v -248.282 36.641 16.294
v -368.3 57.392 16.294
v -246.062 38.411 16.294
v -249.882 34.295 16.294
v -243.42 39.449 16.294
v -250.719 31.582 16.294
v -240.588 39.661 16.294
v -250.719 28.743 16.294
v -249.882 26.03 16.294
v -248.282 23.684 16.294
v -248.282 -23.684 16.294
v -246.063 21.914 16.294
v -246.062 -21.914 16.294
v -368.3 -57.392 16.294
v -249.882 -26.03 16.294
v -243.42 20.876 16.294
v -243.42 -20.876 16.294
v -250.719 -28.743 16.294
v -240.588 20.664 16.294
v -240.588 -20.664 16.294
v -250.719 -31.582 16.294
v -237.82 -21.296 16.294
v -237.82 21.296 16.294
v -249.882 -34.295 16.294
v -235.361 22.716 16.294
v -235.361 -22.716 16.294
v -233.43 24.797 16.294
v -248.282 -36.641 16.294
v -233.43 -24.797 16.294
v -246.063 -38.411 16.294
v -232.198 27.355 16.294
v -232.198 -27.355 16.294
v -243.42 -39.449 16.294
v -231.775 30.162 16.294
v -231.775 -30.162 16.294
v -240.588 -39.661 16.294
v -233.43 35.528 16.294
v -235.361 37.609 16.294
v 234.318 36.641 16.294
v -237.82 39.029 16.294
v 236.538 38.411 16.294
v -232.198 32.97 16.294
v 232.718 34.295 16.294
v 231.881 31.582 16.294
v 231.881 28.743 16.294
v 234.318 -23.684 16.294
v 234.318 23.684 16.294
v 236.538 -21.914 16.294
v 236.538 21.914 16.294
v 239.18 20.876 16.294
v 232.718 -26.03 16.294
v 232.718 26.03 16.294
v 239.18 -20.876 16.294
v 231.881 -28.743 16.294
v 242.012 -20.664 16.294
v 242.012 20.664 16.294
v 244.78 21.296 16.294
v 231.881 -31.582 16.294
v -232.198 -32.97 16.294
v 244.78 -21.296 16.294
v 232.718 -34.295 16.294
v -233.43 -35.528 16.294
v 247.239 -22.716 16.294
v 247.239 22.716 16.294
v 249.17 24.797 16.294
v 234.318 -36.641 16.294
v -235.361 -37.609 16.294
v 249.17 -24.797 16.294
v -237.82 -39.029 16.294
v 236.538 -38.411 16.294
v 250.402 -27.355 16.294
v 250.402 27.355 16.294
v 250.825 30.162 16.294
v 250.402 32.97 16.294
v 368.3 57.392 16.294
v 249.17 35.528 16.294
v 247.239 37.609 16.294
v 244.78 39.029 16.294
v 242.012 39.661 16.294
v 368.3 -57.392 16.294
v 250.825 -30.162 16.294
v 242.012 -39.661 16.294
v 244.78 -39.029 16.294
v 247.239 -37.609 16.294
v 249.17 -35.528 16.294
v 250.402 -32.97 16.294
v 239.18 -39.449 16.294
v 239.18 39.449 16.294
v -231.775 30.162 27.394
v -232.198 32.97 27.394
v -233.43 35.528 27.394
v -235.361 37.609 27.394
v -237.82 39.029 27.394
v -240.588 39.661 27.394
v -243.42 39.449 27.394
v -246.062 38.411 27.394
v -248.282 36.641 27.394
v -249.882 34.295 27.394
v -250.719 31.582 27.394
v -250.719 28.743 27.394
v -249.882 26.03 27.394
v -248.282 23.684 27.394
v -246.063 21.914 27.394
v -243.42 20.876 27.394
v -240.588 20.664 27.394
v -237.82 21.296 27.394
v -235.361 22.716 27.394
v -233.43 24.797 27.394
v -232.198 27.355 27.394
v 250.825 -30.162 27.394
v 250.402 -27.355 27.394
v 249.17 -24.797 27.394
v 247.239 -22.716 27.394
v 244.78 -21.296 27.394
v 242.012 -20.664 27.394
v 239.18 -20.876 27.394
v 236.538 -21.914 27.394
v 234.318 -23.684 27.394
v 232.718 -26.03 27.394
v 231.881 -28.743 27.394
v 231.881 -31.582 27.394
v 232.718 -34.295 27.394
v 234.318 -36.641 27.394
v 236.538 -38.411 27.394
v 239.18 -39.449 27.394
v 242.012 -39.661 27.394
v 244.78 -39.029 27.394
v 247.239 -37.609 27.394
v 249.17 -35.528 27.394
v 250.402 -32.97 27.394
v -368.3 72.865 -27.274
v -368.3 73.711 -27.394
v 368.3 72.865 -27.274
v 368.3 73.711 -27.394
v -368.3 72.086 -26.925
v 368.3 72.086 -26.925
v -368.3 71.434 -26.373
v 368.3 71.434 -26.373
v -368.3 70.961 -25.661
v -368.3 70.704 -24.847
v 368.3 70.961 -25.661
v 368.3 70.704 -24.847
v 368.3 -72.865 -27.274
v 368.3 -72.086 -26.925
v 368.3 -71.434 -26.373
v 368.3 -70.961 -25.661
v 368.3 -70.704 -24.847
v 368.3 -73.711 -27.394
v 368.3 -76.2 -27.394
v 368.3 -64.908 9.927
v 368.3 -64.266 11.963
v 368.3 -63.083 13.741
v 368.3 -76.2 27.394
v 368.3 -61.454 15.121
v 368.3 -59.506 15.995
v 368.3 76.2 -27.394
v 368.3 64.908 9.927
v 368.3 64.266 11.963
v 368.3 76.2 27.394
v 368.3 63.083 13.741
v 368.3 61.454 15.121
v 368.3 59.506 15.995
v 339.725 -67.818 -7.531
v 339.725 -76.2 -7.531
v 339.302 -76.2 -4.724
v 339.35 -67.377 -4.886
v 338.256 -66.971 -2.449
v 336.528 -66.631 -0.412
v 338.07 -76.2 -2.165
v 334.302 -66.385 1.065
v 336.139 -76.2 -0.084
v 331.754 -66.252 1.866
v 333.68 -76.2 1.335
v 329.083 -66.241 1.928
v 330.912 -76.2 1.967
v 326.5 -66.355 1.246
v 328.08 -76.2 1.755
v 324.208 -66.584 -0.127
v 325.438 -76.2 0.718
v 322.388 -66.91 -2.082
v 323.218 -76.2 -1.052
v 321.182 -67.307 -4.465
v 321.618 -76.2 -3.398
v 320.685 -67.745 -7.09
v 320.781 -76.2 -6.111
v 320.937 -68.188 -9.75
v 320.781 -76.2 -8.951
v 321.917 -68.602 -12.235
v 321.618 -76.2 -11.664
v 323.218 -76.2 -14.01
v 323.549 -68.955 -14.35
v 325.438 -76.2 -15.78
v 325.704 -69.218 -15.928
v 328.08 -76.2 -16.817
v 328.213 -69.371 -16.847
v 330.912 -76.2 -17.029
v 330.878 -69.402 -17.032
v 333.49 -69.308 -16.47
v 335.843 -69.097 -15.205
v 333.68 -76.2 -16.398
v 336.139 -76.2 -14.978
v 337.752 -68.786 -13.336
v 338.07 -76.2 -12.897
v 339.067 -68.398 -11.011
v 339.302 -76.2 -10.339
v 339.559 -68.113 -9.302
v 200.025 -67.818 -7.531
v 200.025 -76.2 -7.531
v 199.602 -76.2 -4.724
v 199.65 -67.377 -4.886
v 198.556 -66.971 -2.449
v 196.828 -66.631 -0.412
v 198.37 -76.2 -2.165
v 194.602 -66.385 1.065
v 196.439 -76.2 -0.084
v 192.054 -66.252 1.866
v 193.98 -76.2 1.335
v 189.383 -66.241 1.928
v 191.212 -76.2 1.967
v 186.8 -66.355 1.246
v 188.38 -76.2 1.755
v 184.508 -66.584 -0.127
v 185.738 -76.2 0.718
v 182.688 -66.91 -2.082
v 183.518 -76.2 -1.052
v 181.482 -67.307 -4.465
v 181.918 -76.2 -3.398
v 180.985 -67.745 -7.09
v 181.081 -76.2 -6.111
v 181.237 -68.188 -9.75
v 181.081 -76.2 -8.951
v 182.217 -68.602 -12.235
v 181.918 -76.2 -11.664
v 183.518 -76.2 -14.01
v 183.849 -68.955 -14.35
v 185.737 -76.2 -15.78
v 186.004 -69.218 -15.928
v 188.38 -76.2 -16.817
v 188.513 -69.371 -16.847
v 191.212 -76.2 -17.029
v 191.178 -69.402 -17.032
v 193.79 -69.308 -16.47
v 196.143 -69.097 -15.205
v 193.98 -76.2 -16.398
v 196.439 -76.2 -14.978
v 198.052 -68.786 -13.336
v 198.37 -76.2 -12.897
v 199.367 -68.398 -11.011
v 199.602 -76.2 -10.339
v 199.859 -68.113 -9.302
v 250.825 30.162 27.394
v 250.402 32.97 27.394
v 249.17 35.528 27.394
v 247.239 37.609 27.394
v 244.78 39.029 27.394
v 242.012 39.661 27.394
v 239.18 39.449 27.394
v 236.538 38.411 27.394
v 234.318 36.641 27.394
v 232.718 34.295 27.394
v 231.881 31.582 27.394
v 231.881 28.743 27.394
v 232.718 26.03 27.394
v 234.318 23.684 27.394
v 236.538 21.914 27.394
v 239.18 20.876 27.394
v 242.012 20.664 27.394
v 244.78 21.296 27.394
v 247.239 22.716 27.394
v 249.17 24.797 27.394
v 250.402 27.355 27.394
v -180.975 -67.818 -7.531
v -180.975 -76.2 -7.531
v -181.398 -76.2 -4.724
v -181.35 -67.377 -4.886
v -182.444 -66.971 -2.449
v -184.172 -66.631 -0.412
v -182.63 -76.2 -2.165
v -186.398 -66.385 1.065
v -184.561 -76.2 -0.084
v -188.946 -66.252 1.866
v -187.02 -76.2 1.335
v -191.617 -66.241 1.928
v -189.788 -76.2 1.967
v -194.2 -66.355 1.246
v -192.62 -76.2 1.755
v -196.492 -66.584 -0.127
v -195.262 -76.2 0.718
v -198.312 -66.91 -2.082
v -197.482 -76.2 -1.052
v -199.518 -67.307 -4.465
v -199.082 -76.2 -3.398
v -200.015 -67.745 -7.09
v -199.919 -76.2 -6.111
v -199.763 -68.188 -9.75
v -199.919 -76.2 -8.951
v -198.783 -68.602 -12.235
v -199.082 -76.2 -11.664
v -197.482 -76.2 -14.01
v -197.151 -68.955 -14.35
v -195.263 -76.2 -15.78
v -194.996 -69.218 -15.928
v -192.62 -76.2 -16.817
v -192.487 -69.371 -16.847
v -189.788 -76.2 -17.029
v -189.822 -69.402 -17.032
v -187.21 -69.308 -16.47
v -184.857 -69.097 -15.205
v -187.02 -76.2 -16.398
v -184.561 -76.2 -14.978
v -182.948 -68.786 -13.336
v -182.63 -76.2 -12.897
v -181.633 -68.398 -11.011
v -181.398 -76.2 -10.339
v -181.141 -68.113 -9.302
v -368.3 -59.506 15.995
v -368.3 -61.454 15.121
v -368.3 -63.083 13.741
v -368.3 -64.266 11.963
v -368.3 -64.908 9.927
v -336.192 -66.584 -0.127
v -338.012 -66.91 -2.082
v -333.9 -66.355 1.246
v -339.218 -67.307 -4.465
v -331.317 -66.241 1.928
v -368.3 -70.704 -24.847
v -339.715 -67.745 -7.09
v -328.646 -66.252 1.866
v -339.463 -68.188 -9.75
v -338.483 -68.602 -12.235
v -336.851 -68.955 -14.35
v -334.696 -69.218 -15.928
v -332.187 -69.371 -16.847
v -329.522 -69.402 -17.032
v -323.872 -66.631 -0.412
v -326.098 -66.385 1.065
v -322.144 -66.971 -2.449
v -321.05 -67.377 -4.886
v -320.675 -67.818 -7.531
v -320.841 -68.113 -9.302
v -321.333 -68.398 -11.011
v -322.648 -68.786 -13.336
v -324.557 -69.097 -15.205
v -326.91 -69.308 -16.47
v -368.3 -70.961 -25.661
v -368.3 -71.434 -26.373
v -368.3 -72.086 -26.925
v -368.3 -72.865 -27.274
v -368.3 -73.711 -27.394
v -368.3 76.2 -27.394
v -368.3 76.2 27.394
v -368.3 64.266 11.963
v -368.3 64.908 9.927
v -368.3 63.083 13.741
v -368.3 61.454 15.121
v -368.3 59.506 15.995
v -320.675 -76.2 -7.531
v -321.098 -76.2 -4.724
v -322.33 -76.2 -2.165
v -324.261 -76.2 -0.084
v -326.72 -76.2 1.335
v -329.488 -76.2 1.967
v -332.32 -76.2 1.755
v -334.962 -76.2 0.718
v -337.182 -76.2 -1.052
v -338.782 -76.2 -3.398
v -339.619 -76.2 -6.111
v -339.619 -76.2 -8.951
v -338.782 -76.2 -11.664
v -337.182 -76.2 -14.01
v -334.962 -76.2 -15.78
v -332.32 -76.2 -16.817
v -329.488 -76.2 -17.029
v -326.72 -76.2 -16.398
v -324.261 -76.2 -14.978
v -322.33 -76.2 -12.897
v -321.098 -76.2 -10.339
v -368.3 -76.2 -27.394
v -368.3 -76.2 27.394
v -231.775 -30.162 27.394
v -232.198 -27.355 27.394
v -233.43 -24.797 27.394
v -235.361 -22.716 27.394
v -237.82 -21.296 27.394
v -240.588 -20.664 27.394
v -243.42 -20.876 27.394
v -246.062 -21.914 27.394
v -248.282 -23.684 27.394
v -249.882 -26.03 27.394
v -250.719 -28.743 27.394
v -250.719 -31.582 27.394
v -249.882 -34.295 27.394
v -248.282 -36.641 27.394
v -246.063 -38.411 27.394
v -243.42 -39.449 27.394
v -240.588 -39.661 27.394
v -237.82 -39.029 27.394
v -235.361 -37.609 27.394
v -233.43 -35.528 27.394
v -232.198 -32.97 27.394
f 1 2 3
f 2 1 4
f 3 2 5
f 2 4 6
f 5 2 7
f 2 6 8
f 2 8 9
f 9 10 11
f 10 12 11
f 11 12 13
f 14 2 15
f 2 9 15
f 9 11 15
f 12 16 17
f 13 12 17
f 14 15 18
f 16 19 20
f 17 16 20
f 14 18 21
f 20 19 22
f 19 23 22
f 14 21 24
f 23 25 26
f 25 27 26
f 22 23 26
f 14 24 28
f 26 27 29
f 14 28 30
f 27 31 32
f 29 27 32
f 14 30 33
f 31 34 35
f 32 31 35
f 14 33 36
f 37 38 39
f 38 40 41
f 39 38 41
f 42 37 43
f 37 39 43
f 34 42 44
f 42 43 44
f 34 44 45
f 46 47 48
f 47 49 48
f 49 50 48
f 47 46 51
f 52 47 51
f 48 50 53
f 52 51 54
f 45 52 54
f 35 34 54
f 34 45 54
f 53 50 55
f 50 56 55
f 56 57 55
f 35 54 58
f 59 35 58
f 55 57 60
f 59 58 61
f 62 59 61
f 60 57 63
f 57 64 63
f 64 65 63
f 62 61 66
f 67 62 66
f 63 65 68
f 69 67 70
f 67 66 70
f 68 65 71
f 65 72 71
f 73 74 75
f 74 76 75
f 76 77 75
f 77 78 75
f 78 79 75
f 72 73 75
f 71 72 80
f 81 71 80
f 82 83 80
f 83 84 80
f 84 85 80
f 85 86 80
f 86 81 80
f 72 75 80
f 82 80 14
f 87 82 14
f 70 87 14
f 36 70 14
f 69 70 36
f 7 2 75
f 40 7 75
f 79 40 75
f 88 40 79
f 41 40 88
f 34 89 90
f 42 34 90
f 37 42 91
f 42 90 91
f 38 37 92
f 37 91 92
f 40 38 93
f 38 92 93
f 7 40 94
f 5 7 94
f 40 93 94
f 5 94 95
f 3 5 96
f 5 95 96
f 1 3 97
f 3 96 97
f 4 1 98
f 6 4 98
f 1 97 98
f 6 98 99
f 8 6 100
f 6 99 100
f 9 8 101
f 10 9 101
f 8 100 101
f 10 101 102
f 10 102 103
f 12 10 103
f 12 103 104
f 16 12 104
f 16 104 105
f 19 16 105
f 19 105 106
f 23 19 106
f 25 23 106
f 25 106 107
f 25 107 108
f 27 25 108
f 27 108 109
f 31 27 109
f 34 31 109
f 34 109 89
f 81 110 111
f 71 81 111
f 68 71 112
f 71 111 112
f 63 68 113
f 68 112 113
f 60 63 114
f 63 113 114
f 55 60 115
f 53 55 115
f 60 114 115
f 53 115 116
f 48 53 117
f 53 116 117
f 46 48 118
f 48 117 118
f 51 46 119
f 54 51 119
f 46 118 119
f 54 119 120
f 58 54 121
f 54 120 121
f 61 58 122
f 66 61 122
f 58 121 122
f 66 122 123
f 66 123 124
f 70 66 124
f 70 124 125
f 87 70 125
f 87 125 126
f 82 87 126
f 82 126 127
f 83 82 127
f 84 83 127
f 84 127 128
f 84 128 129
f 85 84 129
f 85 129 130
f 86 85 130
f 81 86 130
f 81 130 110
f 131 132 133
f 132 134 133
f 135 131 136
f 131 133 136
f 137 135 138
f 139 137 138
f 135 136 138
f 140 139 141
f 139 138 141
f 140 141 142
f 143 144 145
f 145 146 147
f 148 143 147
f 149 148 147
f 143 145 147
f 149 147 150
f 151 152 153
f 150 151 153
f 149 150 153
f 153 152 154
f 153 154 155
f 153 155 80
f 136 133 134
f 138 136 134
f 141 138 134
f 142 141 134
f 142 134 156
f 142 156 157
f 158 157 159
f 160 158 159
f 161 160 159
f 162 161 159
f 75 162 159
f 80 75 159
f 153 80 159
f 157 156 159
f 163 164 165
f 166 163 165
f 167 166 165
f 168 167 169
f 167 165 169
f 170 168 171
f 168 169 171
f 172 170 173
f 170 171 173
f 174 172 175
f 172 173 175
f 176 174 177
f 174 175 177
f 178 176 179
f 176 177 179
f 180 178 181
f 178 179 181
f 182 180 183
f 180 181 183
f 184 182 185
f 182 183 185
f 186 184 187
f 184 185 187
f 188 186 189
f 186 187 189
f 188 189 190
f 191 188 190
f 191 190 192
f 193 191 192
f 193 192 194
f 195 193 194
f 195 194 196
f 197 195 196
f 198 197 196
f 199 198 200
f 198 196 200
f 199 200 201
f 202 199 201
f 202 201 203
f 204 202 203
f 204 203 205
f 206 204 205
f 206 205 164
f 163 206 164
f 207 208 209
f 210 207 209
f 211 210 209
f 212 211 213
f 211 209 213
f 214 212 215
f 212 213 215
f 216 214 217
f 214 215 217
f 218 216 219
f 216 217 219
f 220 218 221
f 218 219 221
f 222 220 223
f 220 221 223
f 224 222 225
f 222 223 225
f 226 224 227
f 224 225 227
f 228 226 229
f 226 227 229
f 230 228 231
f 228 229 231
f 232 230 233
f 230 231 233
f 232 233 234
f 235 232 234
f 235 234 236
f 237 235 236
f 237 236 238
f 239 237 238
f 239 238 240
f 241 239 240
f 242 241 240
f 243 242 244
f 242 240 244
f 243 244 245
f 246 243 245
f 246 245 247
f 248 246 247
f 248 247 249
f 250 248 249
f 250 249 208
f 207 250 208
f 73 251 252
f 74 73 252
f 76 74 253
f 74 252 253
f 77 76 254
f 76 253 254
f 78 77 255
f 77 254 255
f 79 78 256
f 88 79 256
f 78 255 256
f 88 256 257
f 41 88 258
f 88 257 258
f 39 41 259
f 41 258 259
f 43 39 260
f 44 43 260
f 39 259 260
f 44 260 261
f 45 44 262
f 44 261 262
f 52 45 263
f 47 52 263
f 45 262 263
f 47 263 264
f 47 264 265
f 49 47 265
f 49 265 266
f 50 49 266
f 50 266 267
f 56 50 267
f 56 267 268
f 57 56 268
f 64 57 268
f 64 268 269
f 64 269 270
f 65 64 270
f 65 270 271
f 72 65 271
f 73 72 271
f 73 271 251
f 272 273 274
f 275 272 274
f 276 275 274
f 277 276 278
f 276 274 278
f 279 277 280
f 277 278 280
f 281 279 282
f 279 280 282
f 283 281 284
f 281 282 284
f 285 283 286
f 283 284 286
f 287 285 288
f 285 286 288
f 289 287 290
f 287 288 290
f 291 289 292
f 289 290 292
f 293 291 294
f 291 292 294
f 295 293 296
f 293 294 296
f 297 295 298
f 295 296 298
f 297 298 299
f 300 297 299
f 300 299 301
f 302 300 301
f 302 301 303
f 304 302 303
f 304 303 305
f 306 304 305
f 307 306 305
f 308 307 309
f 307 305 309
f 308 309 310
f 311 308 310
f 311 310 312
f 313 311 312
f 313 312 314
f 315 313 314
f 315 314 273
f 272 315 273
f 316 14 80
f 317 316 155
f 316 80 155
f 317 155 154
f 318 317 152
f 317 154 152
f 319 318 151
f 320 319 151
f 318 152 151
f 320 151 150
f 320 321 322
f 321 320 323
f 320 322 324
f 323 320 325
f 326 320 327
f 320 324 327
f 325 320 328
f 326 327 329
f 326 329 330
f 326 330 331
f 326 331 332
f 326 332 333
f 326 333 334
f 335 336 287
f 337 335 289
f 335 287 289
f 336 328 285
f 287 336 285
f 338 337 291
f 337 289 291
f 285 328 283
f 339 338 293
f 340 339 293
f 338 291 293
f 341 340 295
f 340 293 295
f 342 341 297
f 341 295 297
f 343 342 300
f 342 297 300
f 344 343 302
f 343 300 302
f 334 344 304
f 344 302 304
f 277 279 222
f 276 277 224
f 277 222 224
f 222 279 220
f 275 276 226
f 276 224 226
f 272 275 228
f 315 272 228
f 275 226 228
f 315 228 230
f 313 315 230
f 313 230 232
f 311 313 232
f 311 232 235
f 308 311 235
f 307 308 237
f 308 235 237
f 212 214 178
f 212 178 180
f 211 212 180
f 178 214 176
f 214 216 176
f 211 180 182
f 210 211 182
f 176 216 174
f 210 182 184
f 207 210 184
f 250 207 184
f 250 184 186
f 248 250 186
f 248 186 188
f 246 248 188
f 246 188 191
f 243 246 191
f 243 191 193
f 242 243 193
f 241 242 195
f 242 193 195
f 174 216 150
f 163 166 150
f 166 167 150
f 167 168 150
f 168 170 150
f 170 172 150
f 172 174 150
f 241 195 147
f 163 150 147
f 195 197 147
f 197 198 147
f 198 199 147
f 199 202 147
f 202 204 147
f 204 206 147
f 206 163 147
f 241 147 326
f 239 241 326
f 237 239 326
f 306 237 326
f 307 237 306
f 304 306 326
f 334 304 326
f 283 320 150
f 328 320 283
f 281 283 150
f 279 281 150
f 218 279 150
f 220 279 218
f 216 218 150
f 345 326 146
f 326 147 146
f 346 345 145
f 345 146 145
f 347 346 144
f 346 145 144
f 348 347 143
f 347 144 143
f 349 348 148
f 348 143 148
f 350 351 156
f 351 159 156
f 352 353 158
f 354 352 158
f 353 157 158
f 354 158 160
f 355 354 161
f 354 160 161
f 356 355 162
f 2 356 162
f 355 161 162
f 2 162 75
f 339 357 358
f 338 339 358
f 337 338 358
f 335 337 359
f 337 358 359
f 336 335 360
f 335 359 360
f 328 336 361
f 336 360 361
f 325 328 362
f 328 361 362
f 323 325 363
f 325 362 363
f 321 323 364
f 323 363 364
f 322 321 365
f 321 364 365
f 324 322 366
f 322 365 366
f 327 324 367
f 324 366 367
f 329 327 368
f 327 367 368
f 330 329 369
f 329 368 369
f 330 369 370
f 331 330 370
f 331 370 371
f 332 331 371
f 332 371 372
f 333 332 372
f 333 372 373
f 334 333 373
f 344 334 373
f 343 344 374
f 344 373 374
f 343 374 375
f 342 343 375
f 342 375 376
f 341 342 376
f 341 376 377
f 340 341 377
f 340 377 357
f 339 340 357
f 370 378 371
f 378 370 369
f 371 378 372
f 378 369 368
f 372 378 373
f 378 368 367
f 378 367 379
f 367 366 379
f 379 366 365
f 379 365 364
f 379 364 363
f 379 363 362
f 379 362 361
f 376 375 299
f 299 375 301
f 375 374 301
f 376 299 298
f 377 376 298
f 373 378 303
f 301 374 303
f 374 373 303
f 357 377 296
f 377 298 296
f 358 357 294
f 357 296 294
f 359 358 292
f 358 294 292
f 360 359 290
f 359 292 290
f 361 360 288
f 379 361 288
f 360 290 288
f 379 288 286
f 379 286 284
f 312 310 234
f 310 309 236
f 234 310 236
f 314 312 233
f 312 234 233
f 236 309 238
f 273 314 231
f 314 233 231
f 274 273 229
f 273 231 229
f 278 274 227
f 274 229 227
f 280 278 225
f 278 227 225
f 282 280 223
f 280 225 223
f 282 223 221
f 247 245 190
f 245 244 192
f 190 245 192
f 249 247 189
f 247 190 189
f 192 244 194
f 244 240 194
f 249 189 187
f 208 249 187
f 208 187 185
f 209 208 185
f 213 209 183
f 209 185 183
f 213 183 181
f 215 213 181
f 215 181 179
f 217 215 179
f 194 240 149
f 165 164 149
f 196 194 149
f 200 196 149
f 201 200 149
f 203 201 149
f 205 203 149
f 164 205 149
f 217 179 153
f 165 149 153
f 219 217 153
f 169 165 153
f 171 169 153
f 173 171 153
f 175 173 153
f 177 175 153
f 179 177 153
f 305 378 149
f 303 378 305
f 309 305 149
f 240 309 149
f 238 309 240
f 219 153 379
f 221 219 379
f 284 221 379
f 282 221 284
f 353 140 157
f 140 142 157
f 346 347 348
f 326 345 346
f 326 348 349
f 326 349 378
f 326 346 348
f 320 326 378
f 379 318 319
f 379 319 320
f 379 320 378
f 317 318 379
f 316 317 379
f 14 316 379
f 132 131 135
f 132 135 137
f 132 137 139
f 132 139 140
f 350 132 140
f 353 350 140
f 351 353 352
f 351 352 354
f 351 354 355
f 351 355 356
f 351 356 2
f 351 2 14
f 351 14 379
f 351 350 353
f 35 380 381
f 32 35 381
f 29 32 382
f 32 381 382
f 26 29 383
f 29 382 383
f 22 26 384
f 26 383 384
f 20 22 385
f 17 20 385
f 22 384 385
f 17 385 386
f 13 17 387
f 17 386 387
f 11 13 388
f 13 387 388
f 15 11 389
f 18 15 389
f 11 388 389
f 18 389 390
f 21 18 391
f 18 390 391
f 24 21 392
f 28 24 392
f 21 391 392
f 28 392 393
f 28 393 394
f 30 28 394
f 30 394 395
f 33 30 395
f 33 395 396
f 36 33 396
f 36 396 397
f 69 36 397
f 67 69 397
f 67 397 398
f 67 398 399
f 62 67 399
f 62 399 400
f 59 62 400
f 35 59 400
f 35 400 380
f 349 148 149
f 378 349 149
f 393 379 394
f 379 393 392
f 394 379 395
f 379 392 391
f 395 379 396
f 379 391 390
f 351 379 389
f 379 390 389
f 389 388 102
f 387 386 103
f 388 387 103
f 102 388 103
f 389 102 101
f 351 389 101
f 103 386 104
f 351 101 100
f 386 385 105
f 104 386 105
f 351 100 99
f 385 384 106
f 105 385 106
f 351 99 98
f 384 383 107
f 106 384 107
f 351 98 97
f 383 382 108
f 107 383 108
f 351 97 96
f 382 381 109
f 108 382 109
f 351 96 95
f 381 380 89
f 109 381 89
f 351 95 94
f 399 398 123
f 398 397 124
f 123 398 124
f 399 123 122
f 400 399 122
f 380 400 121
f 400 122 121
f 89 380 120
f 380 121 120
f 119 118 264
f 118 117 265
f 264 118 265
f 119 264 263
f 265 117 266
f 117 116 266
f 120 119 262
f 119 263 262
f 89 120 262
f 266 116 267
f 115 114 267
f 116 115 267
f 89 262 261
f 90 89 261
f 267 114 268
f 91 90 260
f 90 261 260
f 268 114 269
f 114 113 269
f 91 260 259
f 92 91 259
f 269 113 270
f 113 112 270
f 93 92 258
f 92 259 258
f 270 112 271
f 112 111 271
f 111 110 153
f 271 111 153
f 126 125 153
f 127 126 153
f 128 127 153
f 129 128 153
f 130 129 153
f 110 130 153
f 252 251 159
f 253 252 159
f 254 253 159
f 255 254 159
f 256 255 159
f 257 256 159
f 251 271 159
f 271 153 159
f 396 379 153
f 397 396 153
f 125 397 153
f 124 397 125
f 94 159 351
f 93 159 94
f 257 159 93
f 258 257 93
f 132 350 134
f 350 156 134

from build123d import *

# Parameters (mm, degrees)
BOSS_EXTRUDE1_DEPTH = 368.3
CUT_EXTRUDE1_REACH  = 154.4
SKETCH2_R           = 9.525
CUT_EXTRUDE2_REACH  = 56.788
SKETCH3_R           = 9.525


with BuildPart() as part:
    # Sketch1 → Boss-Extrude1 (new body, symmetric)
    with BuildSketch(Plane(origin=(0, 0, 0), x_dir=(0, 0, -1), z_dir=(1, 0, 0))):
        with BuildLine():
            Line((-27.3939, -76.2), (-27.3939, 76.2))
            Line((-27.3939, 76.2), (27.3939, 76.2))
            Line((27.3939, 76.2), (27.3939, 73.710744653))
            ThreePointArc((27.3939, 73.710744653), (26.67159656, 71.740607726), (24.84702368, 70.704221901))
            Line((24.84702368, 70.704221901), (-9.926909199, 64.908143628))
            ThreePointArc((-9.926909199, 64.908143628), (-14.488341399, 62.317179067), (-16.2941, 57.391836749))
            Line((-16.2941, 57.391836749), (-16.2941, -57.391836749))
            ThreePointArc((-16.2941, -57.391836749), (-14.488341399, -62.317179067), (-9.926909199, -64.908143628))
            Line((-9.926909199, -64.908143628), (24.84702368, -70.704221901))
            ThreePointArc((24.84702368, -70.704221901), (26.67159656, -71.740607726), (27.3939, -73.710744653))
            Line((27.3939, -73.710744653), (27.3939, -76.2))
            Line((27.3939, -76.2), (-27.3939, -76.2))
        make_face()
    extrude(amount=BOSS_EXTRUDE1_DEPTH, both=True)

    # Sketch2 → Cut-Extrude1 (cut, up to next)
    with BuildSketch(Plane.XZ.offset(76.2), mode=Mode.PRIVATE) as cut_extrude1_sk1:
        with Locations((190.5, -7.5311)):
            Circle(SKETCH2_R)
    cut_extrude1_tool1 = extrude(cut_extrude1_sk1.sketch, amount=-CUT_EXTRUDE1_REACH, mode=Mode.PRIVATE) & part.part
    add(cut_extrude1_tool1.solids().sort_by_distance((190.5, -76.2, -7.5311))[0], mode=Mode.SUBTRACT)
    # Sketch2 → Cut-Extrude1 (cut, up to next)
    with BuildSketch(Plane.XZ.offset(76.2), mode=Mode.PRIVATE) as cut_extrude1_sk2:
        with Locations((-190.5, -7.5311)):
            Circle(SKETCH2_R)
    cut_extrude1_tool2 = extrude(cut_extrude1_sk2.sketch, amount=-CUT_EXTRUDE1_REACH, mode=Mode.PRIVATE) & part.part
    add(cut_extrude1_tool2.solids().sort_by_distance((-190.5, -76.2, -7.5311))[0], mode=Mode.SUBTRACT)
    # Sketch2 → Cut-Extrude1 (cut, up to next)
    with BuildSketch(Plane.XZ.offset(76.2), mode=Mode.PRIVATE) as cut_extrude1_sk3:
        with Locations((330.2, -7.5311)):
            Circle(SKETCH2_R)
    cut_extrude1_tool3 = extrude(cut_extrude1_sk3.sketch, amount=-CUT_EXTRUDE1_REACH, mode=Mode.PRIVATE) & part.part
    add(cut_extrude1_tool3.solids().sort_by_distance((330.2, -76.2, -7.5311))[0], mode=Mode.SUBTRACT)
    # Sketch2 → Cut-Extrude1 (cut, up to next)
    with BuildSketch(Plane.XZ.offset(76.2), mode=Mode.PRIVATE) as cut_extrude1_sk4:
        with Locations((-330.2, -7.5311)):
            Circle(SKETCH2_R)
    cut_extrude1_tool4 = extrude(cut_extrude1_sk4.sketch, amount=-CUT_EXTRUDE1_REACH, mode=Mode.PRIVATE) & part.part
    add(cut_extrude1_tool4.solids().sort_by_distance((-330.2, -76.2, -7.5311))[0], mode=Mode.SUBTRACT)

    # Sketch3 → Cut-Extrude2 (cut, up to next)
    with BuildSketch(Plane.XY.offset(27.3939), mode=Mode.PRIVATE) as cut_extrude2_sk1:
        with Locations((241.3, -30.1625)):
            Circle(SKETCH3_R)
    cut_extrude2_tool1 = extrude(cut_extrude2_sk1.sketch, amount=-CUT_EXTRUDE2_REACH, mode=Mode.PRIVATE) & part.part
    add(cut_extrude2_tool1.solids().sort_by_distance((241.3, -30.1625, 27.3939))[0], mode=Mode.SUBTRACT)
    # Sketch3 → Cut-Extrude2 (cut, up to next)
    with BuildSketch(Plane.XY.offset(27.3939), mode=Mode.PRIVATE) as cut_extrude2_sk2:
        with Locations((-241.3, -30.1625)):
            Circle(SKETCH3_R)
    cut_extrude2_tool2 = extrude(cut_extrude2_sk2.sketch, amount=-CUT_EXTRUDE2_REACH, mode=Mode.PRIVATE) & part.part
    add(cut_extrude2_tool2.solids().sort_by_distance((-241.3, -30.1625, 27.3939))[0], mode=Mode.SUBTRACT)
    # Sketch3 → Cut-Extrude2 (cut, up to next)
    with BuildSketch(Plane.XY.offset(27.3939), mode=Mode.PRIVATE) as cut_extrude2_sk3:
        with Locations((-241.3, 30.1625)):
            Circle(SKETCH3_R)
    cut_extrude2_tool3 = extrude(cut_extrude2_sk3.sketch, amount=-CUT_EXTRUDE2_REACH, mode=Mode.PRIVATE) & part.part
    add(cut_extrude2_tool3.solids().sort_by_distance((-241.3, 30.1625, 27.3939))[0], mode=Mode.SUBTRACT)
    # Sketch3 → Cut-Extrude2 (cut, up to next)
    with BuildSketch(Plane.XY.offset(27.3939), mode=Mode.PRIVATE) as cut_extrude2_sk4:
        with Locations((241.3, 30.1625)):
            Circle(SKETCH3_R)
    cut_extrude2_tool4 = extrude(cut_extrude2_sk4.sketch, amount=-CUT_EXTRUDE2_REACH, mode=Mode.PRIVATE) & part.part
    add(cut_extrude2_tool4.solids().sort_by_distance((241.3, 30.1625, 27.3939))[0], mode=Mode.SUBTRACT)


solid = part.part
